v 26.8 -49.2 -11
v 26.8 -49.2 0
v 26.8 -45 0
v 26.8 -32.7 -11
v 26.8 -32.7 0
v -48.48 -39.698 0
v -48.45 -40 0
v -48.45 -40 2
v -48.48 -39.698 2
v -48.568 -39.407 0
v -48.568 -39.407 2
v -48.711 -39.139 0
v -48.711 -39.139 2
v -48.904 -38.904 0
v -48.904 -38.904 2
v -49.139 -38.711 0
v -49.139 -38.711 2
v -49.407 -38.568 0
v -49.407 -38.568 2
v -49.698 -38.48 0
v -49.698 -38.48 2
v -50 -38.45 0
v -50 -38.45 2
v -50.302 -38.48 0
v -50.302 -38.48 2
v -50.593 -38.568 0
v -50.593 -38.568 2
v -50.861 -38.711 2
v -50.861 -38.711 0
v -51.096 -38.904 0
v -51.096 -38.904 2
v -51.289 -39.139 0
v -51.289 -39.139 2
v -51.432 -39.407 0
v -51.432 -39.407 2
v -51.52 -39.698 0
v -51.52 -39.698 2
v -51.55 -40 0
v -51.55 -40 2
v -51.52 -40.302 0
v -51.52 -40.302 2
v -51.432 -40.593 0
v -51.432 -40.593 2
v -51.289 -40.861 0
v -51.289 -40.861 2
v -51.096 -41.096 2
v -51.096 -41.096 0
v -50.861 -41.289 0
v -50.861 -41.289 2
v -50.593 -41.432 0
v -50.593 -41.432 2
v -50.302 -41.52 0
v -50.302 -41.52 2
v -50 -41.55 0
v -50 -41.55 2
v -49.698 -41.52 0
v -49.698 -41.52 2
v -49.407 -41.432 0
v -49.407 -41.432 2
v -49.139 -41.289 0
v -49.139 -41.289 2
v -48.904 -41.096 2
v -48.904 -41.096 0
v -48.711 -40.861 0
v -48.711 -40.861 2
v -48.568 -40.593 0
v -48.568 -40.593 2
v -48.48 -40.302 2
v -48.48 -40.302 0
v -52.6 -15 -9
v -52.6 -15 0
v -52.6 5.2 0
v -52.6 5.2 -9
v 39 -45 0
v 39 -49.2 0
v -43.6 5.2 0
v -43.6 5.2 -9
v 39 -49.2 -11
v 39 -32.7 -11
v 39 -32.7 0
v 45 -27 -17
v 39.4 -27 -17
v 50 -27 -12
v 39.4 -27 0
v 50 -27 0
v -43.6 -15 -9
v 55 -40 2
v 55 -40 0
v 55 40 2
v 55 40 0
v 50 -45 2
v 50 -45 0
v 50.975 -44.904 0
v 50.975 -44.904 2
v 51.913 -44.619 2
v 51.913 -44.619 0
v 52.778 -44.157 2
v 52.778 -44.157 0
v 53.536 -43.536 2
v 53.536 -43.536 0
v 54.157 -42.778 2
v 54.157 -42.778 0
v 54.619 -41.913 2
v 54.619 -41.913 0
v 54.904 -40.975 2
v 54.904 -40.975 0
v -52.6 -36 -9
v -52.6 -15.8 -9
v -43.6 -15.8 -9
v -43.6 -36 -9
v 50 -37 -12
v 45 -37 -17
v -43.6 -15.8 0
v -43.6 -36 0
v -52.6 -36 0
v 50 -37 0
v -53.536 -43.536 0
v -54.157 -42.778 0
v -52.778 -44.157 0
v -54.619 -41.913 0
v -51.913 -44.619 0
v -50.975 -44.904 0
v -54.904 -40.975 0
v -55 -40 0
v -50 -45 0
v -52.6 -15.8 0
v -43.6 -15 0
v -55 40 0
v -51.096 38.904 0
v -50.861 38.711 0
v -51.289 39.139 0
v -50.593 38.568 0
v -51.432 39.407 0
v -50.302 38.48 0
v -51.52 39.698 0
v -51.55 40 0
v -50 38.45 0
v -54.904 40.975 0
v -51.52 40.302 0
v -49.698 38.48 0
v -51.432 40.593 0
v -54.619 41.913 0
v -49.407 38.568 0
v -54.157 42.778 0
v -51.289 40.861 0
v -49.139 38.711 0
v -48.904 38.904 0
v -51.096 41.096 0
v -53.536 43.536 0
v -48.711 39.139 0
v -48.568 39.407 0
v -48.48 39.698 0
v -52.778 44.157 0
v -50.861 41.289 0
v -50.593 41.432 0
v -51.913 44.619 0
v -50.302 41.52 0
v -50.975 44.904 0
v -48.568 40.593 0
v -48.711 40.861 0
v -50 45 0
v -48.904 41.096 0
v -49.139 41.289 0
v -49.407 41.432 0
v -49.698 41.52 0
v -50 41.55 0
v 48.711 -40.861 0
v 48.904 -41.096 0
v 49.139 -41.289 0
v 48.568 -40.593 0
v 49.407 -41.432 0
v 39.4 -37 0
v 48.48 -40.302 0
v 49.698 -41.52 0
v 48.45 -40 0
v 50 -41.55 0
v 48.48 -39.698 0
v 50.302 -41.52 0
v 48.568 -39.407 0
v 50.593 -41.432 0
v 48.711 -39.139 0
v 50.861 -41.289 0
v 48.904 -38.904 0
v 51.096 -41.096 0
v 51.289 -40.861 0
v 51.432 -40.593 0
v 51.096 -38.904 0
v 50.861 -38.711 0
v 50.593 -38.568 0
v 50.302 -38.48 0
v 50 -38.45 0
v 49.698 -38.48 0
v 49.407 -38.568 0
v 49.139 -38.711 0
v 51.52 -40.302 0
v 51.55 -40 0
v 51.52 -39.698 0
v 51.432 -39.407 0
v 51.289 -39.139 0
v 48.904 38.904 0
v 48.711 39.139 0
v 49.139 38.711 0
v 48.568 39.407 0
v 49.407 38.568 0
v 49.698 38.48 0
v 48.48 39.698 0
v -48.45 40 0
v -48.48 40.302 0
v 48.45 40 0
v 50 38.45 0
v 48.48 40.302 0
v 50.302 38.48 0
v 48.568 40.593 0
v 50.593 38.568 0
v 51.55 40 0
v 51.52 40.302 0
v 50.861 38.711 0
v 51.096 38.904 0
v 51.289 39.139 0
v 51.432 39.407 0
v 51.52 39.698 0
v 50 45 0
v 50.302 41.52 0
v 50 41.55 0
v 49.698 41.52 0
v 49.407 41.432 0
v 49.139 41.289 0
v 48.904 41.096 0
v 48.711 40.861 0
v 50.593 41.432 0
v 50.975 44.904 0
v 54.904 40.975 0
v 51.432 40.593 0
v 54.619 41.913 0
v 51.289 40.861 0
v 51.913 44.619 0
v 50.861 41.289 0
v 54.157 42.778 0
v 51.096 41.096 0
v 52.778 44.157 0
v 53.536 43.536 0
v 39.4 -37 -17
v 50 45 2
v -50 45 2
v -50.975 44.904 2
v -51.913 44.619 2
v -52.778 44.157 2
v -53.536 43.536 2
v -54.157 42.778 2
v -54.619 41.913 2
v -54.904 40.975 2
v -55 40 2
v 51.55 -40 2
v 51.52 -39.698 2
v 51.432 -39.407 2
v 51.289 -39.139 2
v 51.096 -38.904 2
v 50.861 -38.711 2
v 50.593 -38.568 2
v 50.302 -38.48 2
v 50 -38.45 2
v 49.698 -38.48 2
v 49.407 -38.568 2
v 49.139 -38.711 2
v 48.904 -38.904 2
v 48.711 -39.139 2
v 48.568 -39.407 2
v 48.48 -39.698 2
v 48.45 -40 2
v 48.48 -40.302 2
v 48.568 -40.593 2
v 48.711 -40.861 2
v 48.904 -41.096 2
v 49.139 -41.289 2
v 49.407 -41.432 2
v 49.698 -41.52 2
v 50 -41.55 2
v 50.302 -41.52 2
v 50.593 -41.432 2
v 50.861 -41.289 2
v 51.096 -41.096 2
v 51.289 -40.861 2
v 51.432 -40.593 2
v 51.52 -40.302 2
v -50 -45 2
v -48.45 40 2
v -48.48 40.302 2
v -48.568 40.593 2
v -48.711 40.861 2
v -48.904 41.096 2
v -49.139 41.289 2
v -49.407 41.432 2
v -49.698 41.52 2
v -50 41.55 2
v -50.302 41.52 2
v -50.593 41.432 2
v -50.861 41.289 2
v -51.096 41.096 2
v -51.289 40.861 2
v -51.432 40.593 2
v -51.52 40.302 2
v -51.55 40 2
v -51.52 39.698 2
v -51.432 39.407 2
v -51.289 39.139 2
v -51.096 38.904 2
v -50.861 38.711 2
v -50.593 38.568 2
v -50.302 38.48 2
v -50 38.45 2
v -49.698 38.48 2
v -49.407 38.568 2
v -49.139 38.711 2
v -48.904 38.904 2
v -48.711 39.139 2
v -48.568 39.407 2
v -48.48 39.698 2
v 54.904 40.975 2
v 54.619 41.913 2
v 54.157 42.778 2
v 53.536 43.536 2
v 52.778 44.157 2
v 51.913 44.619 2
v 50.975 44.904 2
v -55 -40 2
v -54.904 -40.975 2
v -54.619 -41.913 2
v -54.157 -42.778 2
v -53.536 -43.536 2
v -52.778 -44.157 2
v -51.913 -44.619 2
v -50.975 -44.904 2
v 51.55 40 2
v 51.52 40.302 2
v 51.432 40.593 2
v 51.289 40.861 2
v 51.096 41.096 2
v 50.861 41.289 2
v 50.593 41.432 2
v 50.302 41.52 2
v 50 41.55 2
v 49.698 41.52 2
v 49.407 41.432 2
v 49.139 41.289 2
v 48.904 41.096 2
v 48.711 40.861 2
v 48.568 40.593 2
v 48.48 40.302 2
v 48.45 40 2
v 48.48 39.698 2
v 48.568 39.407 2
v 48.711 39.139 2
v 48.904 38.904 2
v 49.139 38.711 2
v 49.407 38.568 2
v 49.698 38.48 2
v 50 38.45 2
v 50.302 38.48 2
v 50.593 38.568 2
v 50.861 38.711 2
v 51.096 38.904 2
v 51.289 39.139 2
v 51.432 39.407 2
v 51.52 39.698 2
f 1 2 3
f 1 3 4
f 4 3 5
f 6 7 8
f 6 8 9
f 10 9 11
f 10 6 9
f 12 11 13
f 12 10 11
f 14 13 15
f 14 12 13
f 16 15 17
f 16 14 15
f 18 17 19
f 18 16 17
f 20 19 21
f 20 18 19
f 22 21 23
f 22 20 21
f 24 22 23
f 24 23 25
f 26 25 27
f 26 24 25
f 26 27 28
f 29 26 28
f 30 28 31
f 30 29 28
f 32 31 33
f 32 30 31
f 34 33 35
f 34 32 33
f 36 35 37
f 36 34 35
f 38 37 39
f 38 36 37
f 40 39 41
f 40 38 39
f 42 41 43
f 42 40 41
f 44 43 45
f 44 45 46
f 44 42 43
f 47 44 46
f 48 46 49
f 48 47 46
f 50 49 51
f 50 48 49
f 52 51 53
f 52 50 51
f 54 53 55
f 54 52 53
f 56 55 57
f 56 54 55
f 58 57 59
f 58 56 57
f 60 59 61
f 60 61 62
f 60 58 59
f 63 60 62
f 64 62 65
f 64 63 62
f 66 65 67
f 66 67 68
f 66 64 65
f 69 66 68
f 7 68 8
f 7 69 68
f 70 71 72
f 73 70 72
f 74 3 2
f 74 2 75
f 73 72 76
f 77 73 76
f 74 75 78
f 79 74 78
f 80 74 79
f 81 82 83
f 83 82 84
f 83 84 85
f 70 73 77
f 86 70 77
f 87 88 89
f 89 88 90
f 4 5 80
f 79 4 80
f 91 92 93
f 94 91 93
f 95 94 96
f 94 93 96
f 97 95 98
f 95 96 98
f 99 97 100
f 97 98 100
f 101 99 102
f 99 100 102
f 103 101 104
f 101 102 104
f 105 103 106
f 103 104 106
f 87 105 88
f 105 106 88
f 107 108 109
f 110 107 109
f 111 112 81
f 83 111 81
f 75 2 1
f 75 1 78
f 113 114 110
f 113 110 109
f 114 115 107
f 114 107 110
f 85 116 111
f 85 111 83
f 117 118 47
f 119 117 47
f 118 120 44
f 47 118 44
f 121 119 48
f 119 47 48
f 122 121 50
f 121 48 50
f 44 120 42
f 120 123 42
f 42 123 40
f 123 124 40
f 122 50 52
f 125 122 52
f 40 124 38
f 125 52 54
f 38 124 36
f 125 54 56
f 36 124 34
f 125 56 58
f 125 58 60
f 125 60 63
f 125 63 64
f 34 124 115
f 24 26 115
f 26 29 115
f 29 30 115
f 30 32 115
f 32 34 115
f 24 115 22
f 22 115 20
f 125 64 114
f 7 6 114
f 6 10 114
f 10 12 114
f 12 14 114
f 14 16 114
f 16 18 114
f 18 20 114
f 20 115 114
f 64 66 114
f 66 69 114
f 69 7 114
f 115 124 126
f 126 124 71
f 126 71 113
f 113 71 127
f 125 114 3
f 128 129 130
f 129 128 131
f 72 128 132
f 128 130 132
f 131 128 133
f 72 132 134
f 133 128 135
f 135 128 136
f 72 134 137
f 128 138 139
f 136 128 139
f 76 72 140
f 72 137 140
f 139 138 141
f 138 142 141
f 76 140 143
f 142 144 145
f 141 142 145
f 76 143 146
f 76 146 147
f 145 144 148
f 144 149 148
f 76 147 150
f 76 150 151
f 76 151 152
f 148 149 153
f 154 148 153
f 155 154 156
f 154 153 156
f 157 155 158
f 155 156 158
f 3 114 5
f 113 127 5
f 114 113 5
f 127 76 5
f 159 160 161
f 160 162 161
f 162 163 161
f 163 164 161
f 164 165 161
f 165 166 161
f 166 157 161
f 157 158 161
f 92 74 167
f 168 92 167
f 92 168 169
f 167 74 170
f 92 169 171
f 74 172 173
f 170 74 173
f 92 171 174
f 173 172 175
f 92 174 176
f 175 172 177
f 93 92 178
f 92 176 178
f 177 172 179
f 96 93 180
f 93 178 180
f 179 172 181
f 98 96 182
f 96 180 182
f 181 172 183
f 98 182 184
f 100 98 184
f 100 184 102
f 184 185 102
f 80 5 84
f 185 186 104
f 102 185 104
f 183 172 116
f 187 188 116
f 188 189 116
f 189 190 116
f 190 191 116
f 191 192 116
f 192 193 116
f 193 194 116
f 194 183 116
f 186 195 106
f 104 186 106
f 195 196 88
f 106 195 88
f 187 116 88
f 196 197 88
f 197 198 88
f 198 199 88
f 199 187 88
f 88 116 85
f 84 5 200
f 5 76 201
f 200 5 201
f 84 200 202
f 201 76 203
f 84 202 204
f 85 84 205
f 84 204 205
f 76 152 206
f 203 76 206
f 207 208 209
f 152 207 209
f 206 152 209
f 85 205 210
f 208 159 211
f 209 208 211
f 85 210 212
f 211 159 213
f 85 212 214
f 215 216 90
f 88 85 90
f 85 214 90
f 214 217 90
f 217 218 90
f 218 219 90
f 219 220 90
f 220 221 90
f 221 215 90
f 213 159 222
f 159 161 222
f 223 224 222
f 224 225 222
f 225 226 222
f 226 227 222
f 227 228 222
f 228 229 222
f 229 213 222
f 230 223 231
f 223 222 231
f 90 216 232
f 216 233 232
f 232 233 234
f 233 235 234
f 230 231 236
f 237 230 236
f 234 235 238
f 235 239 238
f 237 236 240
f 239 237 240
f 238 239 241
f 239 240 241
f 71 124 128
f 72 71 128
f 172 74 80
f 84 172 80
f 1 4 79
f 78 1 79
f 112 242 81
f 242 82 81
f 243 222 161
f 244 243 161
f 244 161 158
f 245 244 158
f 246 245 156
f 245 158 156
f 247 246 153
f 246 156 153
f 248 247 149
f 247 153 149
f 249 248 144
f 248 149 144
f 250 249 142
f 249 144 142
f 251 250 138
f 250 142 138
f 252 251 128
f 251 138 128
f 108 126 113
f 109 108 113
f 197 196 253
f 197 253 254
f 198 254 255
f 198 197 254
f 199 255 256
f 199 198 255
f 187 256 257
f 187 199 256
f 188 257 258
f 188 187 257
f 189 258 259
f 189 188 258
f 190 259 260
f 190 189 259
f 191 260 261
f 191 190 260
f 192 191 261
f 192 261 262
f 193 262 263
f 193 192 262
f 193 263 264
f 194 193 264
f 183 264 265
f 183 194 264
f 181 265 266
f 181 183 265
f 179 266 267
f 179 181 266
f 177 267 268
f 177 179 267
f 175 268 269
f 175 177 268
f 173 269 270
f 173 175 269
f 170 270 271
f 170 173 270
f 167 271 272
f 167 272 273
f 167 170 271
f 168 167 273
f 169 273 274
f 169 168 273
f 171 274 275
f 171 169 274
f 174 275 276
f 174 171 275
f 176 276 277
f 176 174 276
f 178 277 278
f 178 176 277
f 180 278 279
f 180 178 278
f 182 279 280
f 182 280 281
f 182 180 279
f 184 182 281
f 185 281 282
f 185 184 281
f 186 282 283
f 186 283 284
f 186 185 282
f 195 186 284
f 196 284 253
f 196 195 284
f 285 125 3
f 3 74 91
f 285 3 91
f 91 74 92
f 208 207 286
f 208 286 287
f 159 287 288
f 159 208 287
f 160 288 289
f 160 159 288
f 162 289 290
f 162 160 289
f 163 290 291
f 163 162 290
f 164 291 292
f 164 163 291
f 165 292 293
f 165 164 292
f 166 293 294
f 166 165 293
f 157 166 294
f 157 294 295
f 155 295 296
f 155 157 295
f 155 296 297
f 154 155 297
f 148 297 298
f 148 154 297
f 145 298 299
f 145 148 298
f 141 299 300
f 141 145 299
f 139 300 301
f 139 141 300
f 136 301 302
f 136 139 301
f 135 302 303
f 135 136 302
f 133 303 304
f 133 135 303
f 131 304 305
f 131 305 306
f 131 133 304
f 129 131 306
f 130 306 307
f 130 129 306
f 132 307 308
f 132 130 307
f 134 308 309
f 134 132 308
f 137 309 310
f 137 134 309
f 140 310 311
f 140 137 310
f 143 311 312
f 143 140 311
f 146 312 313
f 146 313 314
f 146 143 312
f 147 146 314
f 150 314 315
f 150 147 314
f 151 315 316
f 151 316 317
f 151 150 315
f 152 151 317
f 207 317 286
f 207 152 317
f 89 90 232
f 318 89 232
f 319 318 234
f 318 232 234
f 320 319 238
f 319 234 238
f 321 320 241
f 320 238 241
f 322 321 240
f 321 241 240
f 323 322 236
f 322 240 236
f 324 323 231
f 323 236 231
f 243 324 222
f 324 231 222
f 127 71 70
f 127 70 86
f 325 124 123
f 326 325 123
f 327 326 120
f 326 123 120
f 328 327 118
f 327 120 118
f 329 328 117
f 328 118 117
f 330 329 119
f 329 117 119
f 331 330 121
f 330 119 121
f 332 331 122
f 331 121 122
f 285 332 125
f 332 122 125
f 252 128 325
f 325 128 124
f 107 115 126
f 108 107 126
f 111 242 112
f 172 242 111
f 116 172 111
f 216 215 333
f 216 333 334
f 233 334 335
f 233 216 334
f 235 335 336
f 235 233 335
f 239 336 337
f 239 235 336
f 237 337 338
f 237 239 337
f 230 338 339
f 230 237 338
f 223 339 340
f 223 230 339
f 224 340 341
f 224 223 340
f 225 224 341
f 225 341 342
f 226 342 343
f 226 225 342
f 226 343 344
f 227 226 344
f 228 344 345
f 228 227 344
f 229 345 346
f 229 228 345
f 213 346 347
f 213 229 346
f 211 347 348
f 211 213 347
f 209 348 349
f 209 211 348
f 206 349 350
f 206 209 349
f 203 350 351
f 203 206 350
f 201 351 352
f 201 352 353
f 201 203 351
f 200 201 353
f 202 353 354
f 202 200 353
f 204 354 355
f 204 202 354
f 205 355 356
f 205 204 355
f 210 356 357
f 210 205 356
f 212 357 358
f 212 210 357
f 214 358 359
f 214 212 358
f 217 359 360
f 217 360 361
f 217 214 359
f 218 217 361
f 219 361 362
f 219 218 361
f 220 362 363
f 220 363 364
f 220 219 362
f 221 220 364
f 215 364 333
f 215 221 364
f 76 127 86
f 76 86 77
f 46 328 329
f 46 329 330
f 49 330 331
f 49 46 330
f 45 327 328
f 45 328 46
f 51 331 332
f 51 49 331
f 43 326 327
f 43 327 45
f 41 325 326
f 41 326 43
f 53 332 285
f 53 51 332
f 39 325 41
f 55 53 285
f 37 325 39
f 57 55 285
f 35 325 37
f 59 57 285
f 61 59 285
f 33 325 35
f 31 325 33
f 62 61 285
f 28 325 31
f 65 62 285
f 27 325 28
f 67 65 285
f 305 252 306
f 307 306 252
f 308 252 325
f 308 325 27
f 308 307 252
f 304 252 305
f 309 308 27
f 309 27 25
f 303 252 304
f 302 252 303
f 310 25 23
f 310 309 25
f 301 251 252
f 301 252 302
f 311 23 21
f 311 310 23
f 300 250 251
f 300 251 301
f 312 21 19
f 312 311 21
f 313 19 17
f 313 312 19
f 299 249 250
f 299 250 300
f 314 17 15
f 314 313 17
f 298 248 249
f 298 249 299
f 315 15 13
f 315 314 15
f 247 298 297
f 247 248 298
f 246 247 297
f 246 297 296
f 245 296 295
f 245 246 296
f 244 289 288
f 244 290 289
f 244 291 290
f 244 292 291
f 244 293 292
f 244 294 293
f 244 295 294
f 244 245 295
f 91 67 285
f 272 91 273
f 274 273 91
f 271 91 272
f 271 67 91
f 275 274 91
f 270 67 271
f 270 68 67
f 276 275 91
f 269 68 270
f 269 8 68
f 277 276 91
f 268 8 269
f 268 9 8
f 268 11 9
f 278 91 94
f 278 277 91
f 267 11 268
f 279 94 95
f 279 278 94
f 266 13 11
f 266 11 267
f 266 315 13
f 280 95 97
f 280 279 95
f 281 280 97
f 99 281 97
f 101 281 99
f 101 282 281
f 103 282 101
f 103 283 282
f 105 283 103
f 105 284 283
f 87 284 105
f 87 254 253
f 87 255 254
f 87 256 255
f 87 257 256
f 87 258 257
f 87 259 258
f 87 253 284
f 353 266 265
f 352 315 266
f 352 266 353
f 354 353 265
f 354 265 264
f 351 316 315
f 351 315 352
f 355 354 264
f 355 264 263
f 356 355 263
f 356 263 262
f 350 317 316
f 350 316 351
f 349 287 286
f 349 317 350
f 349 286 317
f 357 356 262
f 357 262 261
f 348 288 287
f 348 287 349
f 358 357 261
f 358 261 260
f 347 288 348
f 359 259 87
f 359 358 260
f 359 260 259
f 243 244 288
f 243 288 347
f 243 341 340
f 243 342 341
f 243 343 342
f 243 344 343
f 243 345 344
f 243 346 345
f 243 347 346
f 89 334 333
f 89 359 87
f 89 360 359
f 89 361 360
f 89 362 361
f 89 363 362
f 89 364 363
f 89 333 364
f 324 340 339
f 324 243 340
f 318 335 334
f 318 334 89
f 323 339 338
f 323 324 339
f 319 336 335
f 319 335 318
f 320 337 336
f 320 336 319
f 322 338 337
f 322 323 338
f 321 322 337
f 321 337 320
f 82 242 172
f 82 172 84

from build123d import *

# Parameters (mm, degrees)
F0_R     = 1.55
F1_DEPTH = 2
F2_W     = 12.2
F2_H     = 16.5
F3_DEPTH = 11
F2_W_2   = 10.6
F2_H_2   = 10
F4_DEPTH = 17
F5_SIZE  = 5
F2_W_3   = 9
F2_H_3   = 20.2
F6_DEPTH = 9


with BuildPart() as f1:
    # F0 (on Top) → F1 (new body)
    with BuildSketch(Plane.XY):
        with BuildLine():
            Line((50, 45), (-50, 45))
            ThreePointArc((-50, 45), (-53.535534, 43.535534), (-55, 40))
            Line((-55, 40), (-55, -40))
            ThreePointArc((-55, -40), (-53.535534, -43.535534), (-50, -45))
            Line((-50, -45), (50, -45))
            ThreePointArc((50, -45), (53.535534, -43.535534), (55, -40))
            Line((55, -40), (55, 40))
            ThreePointArc((55, 40), (53.535534, 43.535534), (50, 45))
        make_face()
        with Locations((-50, -40)):
            Circle(F0_R, mode=Mode.SUBTRACT)
        with Locations((50, -40)):
            Circle(F0_R, mode=Mode.SUBTRACT)
        with Locations((-50, 40)):
            Circle(F0_R, mode=Mode.SUBTRACT)
        with Locations((50, 40)):
            Circle(F0_R, mode=Mode.SUBTRACT)
    extrude(amount=F1_DEPTH)

    # F2 (on Top) → F3 (join)
    with BuildSketch(Plane.XY):
        with Locations((32.9, -40.95)):
            Rectangle(F2_W, F2_H)
    extrude(amount=-F3_DEPTH)

    # F2 (on Top) → F4 (join)
    with BuildSketch(Plane.XY):
        with Locations((44.7, -32)):
            Rectangle(F2_W_2, F2_H_2)
    extrude(amount=-F4_DEPTH)

    # F5
    f5_edges = [f1.edges().sort_by_distance(p)[0] for p in [
        (50, -32, -17),
    ]]
    chamfer(f5_edges, length=F5_SIZE)

    # F2 (on Top) → F6 (join)
    with BuildSketch(Plane.XY):
        with Locations((-48.1, -25.9)):
            Rectangle(F2_W_3, F2_H_3)
        with Locations((-48.1, -4.9)):
            Rectangle(F2_W_3, F2_H_3)
    extrude(amount=-F6_DEPTH)


solid = f1.part
